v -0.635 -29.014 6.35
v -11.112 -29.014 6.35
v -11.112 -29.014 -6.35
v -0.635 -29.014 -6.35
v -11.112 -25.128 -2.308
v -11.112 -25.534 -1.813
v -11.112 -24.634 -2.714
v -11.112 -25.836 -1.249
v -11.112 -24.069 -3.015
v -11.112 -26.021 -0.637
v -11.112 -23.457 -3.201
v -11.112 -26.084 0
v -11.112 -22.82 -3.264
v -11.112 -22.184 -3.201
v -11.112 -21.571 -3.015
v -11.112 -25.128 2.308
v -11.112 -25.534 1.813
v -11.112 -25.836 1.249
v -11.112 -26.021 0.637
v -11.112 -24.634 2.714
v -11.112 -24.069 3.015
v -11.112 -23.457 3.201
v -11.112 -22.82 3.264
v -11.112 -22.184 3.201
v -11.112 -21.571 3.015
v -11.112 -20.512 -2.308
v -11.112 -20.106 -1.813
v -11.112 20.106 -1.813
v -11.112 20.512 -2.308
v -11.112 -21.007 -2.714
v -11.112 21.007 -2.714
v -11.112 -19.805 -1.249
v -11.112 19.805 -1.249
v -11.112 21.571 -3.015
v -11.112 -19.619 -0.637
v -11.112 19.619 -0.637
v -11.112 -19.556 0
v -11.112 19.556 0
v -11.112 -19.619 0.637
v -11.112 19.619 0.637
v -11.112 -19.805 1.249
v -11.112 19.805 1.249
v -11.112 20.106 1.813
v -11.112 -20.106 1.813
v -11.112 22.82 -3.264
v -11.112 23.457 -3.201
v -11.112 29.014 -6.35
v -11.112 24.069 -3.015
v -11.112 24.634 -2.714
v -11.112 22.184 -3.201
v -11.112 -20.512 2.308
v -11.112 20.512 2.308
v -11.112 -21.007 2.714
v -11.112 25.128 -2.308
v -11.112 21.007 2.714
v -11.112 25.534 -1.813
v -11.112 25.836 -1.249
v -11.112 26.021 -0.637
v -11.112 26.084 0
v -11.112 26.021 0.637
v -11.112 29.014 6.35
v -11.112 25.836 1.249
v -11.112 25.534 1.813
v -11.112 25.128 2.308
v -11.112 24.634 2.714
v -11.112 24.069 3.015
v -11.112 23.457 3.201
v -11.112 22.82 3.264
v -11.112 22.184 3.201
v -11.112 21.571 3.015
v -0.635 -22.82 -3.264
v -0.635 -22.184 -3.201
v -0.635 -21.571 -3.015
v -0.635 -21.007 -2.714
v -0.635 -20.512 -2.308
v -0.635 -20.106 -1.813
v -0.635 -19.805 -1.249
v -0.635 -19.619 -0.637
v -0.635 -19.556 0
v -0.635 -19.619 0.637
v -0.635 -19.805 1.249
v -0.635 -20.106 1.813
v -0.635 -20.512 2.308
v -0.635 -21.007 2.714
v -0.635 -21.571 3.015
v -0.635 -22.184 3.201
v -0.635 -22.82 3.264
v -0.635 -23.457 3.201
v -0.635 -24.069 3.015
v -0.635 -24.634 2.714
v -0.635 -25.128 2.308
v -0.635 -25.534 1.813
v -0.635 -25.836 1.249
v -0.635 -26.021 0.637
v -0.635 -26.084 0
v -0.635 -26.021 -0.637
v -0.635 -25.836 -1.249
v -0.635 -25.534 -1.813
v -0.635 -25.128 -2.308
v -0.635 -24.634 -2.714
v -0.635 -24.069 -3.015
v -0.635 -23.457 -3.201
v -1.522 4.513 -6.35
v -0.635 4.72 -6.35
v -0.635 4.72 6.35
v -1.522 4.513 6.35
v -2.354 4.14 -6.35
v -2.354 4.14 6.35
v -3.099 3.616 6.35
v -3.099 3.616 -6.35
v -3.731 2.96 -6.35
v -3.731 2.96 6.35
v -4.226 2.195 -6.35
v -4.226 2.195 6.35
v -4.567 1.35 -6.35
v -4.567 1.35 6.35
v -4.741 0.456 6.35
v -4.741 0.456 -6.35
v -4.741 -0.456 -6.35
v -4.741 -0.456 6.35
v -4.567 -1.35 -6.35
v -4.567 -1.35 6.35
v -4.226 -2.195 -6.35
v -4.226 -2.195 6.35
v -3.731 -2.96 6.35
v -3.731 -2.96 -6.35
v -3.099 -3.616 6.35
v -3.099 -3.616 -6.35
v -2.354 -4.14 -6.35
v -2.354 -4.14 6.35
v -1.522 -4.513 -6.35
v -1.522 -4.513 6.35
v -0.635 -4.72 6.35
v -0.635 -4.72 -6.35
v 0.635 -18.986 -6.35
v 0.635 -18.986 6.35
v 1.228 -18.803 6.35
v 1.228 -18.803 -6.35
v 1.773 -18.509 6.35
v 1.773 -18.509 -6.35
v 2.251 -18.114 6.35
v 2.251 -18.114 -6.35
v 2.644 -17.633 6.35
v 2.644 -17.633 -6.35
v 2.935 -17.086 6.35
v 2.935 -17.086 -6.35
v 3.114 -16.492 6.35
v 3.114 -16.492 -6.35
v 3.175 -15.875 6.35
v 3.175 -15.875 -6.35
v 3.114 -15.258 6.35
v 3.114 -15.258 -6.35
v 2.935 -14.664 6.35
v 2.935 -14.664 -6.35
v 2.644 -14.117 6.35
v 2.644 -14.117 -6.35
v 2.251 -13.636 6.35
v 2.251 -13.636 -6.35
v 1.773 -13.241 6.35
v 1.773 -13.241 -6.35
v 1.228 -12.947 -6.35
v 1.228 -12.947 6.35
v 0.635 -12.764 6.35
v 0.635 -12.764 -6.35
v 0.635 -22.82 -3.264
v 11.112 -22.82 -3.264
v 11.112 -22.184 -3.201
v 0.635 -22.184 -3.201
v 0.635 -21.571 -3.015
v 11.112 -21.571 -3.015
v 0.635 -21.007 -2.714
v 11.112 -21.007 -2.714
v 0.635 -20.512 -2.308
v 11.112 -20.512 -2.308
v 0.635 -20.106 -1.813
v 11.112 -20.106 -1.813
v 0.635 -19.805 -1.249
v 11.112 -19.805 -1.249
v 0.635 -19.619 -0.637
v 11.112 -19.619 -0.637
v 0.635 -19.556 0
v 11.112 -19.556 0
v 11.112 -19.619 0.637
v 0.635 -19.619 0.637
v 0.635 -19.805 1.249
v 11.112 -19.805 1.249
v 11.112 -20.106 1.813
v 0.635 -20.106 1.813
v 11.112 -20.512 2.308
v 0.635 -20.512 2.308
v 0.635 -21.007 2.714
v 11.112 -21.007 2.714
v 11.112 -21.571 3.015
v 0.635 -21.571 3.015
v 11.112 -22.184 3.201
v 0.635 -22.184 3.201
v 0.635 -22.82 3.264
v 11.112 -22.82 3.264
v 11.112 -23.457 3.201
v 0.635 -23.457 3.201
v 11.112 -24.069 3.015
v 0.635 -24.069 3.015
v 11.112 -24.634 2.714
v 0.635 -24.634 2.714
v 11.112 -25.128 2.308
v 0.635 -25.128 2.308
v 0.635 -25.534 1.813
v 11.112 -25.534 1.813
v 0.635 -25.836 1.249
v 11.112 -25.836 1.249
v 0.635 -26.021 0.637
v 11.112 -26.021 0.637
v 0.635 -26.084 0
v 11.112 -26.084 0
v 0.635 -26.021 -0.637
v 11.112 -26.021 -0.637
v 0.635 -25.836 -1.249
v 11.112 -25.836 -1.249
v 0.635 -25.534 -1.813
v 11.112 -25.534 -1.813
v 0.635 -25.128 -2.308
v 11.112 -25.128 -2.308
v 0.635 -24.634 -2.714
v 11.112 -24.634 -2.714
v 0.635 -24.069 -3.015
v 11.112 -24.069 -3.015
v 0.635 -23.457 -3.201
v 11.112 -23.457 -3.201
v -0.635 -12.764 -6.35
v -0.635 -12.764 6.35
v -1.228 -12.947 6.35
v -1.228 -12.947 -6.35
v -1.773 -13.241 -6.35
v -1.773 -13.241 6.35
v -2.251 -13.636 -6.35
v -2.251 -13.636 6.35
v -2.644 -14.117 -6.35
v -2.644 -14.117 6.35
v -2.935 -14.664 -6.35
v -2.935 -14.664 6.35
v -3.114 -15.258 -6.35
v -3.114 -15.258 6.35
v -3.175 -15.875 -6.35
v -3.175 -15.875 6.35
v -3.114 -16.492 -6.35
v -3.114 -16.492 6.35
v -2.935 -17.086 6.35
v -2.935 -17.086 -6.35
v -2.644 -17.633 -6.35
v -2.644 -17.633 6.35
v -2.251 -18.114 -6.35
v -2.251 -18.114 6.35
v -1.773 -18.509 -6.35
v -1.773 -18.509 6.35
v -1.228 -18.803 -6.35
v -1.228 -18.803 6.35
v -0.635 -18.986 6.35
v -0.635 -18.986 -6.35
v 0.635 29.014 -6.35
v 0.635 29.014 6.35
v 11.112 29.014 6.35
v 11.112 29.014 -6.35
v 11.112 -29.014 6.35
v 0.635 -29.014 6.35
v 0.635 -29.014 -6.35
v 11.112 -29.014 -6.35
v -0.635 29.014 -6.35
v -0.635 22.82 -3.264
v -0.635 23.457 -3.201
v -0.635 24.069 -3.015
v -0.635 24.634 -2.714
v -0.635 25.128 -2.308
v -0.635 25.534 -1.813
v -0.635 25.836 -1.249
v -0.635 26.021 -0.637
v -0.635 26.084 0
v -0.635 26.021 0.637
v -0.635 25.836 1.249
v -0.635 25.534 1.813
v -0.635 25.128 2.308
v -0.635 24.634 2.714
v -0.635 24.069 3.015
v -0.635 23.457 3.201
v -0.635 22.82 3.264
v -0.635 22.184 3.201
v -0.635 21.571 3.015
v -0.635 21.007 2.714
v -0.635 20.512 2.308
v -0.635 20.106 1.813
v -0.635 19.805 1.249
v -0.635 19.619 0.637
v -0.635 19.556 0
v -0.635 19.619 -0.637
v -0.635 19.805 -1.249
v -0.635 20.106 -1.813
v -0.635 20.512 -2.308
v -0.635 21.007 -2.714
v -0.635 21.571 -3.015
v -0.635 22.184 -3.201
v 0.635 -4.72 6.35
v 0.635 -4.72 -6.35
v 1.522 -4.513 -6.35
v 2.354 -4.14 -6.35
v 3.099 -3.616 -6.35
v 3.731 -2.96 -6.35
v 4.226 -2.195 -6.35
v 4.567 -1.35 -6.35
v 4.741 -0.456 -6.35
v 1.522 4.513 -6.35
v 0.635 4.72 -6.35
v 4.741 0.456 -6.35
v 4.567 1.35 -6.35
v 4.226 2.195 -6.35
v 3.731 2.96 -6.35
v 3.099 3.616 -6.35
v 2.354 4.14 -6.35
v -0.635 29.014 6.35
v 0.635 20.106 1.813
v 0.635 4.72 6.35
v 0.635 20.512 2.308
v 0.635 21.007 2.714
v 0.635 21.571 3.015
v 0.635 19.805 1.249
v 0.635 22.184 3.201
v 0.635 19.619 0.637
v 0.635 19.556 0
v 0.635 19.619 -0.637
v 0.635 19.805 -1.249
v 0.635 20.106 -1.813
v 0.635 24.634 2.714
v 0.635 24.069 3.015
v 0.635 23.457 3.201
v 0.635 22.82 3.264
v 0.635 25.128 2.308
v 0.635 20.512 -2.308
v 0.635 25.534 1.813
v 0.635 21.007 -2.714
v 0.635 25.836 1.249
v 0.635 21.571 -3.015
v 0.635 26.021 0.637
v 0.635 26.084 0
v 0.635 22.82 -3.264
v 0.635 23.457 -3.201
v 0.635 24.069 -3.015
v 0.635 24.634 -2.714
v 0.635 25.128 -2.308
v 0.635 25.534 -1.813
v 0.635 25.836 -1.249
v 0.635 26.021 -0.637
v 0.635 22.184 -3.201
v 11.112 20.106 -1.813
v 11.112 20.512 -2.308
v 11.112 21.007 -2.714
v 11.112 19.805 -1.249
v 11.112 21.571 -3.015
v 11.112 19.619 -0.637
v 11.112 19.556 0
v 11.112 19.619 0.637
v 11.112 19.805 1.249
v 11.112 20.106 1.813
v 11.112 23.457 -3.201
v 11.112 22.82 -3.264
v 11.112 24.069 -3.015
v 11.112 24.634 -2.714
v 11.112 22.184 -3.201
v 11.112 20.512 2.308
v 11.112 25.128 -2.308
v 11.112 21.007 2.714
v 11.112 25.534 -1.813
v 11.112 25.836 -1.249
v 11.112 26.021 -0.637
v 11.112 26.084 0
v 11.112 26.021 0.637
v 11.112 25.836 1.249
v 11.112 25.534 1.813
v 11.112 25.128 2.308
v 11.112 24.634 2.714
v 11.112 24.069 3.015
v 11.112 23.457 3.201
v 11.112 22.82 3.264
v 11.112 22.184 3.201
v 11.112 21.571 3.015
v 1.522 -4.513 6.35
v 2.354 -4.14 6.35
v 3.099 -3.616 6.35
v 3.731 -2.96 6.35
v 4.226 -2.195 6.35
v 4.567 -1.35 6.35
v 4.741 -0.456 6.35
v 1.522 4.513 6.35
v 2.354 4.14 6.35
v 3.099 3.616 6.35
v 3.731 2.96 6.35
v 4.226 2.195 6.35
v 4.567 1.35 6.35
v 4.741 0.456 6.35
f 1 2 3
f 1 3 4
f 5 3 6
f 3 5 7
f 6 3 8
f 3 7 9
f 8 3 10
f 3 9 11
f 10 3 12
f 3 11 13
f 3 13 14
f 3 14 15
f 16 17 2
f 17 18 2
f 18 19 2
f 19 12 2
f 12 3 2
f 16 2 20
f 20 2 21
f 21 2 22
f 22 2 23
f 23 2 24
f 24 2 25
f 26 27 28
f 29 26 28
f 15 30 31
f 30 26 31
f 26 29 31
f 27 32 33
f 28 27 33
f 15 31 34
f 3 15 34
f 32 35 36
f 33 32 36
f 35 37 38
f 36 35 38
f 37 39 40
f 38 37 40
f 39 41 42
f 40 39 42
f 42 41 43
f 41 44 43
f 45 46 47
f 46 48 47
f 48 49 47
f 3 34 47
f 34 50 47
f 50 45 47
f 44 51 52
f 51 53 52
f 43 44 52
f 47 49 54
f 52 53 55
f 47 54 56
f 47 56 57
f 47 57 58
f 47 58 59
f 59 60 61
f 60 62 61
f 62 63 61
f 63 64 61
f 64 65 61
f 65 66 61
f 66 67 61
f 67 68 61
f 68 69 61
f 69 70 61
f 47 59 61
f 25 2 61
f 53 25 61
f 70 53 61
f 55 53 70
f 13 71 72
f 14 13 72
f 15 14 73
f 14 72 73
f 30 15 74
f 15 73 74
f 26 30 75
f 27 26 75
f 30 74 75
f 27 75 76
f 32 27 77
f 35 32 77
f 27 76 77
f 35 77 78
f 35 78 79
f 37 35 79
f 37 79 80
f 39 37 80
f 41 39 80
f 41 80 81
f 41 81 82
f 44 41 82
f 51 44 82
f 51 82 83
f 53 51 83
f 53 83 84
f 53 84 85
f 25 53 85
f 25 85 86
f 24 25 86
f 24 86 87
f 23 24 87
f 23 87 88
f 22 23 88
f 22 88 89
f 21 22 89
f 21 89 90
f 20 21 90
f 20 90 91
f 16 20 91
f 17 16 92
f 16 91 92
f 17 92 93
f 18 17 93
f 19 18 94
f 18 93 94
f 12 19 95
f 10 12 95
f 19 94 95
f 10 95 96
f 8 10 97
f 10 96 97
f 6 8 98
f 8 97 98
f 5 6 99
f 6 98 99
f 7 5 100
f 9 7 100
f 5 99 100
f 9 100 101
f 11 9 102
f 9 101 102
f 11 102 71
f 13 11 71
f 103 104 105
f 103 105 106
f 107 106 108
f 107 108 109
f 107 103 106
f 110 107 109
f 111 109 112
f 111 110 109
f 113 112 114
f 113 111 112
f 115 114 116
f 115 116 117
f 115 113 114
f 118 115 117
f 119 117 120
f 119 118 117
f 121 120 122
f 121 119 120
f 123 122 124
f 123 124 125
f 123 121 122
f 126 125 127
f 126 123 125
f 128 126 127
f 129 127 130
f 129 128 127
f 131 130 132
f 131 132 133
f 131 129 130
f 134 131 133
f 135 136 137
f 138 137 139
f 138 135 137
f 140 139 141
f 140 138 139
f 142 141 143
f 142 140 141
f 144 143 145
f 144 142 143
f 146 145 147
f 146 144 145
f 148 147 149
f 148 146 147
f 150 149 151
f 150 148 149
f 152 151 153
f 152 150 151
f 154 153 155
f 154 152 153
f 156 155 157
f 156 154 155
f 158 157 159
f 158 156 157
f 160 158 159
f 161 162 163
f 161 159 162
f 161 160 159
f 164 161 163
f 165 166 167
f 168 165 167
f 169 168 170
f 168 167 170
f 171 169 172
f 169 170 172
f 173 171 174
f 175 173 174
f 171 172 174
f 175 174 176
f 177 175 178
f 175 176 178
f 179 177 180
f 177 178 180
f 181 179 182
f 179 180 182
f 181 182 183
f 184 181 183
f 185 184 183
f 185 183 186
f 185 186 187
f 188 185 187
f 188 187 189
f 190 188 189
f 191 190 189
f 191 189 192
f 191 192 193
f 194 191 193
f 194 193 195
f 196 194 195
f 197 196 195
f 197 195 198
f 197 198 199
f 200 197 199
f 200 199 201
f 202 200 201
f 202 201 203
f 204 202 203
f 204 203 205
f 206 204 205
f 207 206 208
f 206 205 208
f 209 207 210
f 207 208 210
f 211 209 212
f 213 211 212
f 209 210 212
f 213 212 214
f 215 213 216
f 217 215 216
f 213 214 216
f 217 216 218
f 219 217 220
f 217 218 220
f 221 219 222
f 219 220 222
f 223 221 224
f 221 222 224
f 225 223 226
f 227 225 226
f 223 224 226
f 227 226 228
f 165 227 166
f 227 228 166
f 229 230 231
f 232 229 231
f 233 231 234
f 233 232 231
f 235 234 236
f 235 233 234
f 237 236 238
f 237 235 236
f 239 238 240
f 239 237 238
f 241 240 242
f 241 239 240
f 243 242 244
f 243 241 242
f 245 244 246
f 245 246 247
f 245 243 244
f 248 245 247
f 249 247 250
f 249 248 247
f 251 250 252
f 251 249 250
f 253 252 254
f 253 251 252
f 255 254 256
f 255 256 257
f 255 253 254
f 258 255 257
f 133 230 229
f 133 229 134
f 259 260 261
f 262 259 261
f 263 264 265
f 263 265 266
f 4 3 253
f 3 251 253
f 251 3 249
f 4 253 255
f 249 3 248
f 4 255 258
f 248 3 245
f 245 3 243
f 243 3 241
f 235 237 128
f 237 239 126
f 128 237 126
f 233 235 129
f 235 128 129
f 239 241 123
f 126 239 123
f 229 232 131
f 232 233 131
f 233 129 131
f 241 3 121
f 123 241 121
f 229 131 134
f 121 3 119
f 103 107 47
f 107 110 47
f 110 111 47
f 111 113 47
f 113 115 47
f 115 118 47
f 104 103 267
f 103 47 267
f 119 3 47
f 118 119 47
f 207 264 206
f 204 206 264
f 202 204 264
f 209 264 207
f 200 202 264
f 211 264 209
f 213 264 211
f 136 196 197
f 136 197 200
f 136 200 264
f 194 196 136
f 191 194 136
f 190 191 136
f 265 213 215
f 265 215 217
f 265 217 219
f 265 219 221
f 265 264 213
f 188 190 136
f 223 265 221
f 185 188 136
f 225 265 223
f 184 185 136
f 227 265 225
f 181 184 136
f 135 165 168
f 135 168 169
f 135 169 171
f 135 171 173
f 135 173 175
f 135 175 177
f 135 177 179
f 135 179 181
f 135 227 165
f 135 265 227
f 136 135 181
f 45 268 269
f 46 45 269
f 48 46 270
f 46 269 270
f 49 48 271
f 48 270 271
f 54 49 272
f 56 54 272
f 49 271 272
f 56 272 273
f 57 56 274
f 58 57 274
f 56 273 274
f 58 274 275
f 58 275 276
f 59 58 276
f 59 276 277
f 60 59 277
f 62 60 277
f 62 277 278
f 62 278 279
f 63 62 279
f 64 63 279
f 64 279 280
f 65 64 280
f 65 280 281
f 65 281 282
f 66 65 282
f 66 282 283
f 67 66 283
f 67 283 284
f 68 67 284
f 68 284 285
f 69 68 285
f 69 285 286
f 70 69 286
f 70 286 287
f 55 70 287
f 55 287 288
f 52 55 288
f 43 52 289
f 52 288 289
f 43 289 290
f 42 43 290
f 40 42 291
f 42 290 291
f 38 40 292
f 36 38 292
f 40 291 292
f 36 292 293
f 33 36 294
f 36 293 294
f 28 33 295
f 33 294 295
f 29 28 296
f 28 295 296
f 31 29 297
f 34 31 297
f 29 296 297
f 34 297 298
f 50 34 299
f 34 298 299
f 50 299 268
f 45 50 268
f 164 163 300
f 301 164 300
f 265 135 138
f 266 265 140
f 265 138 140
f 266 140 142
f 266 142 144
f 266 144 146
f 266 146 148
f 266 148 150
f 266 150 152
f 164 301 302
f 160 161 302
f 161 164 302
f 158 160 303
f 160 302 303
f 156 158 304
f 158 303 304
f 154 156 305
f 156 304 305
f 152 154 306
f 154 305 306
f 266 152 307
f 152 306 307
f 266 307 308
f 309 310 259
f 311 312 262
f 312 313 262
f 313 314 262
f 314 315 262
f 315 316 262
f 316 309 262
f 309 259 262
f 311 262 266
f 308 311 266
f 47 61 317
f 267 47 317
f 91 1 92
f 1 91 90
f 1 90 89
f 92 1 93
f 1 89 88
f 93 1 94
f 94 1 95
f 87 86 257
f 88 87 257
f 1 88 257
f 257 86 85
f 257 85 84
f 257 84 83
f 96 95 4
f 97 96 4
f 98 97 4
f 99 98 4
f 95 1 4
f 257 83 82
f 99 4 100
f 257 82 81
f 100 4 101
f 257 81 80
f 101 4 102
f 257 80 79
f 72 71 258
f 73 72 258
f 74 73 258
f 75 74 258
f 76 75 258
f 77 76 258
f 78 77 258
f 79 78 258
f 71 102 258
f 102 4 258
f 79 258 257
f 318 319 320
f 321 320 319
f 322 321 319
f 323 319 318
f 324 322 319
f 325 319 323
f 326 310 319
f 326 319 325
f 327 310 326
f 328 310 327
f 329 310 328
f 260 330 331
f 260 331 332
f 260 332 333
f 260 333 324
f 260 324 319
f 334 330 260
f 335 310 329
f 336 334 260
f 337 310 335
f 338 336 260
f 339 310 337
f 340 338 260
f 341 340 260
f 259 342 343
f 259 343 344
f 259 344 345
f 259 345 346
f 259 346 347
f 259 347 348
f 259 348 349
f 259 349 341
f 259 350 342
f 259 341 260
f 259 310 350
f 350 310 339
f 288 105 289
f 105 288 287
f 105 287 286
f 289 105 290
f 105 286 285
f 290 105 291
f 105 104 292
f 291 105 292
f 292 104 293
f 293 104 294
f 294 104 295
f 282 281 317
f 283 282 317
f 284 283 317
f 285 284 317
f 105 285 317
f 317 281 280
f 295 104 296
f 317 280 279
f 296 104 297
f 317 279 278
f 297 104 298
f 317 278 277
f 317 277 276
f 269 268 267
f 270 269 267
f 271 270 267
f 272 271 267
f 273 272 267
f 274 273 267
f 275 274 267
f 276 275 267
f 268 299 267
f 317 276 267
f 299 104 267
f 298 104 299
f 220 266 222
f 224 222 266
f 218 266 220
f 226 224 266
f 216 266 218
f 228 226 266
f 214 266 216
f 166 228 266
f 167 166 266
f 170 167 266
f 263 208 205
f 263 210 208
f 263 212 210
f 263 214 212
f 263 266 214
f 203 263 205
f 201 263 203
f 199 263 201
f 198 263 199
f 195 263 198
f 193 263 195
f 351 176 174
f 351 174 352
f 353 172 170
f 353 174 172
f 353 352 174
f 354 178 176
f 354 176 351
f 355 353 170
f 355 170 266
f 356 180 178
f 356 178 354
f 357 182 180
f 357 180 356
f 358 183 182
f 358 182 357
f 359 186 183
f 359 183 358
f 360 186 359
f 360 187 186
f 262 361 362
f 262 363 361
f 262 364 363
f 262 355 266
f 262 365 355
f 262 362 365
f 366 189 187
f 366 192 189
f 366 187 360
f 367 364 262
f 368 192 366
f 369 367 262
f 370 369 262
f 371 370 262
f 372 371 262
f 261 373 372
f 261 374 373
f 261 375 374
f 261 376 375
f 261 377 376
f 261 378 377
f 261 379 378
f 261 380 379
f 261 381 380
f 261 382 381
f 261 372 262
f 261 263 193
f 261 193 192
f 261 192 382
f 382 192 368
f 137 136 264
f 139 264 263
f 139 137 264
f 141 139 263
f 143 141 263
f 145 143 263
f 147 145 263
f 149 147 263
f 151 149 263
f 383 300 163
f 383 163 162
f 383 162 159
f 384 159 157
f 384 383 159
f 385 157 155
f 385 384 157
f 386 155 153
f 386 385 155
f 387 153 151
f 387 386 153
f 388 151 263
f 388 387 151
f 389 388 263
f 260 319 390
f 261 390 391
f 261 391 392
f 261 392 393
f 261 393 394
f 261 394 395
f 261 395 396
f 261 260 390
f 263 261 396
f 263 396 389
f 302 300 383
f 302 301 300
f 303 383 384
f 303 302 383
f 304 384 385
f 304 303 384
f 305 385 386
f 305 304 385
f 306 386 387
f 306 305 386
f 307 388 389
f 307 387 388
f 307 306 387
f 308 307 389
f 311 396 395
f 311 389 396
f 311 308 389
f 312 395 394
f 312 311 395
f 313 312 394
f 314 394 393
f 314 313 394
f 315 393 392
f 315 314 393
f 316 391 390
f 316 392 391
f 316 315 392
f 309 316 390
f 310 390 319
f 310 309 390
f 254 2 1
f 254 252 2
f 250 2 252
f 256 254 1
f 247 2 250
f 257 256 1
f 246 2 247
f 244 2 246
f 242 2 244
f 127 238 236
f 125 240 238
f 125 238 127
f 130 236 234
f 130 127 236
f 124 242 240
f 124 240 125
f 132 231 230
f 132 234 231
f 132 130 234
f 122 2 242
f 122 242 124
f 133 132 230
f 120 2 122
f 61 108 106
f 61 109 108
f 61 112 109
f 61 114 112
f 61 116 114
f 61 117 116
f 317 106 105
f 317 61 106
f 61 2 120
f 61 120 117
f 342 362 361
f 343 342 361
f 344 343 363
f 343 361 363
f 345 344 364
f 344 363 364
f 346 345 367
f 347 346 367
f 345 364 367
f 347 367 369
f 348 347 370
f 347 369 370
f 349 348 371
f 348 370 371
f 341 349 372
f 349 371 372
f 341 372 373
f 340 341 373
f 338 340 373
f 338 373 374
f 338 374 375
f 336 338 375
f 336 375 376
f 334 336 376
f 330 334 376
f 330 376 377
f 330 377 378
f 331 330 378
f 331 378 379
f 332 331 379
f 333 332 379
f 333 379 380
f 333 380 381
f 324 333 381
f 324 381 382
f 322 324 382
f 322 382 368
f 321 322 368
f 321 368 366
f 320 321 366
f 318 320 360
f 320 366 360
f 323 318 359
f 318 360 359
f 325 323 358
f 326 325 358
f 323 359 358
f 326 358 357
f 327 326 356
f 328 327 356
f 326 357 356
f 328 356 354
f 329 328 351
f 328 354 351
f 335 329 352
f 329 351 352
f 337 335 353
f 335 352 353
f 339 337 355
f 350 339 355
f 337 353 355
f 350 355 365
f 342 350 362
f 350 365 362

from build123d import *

# Parameters (mm, degrees)
SKETCH1_W               = 22.225
SKETCH1_H               = 58.027453668
SKETCH1_R               = 4.7625
SKETCH1_R_2             = 3.175
BOSS_EXTRUDE1_DEPTH     = 6.35
F_1_4_CLEARANCE_HOLE1_D = 6.5278
CUT_EXTRUDE1_DEPTH      = 32.711299265
CUT_EXTRUDE1_DEPTH_BACK = 32.711299265
SKETCH4_W               = 1.27
SKETCH4_H               = 62.020650964


with BuildPart() as part:
    # Sketch1 → Boss-Extrude1 (new, symmetric)
    with BuildSketch(Plane.XY):
        Rectangle(SKETCH1_W, SKETCH1_H)
        Circle(SKETCH1_R, mode=Mode.SUBTRACT)
        with Locations((0, -15.875)):
            Circle(SKETCH1_R_2, mode=Mode.SUBTRACT)
    extrude(amount=BOSS_EXTRUDE1_DEPTH, both=True)

    # 1/4 Clearance Hole1 (through all)
    with Locations(Plane.ZY.offset(11.1125)):
        with Locations((0, 22.8203125), (0, -22.8203125)):
            Hole(F_1_4_CLEARANCE_HOLE1_D / 2)

    # Sketch4 → Cut-Extrude1 (cut, two sides: drawn at the far end of the back side and taken through both)
    with BuildSketch(Plane.XY.offset(-CUT_EXTRUDE1_DEPTH_BACK)):
        Rectangle(SKETCH4_W, SKETCH4_H)
    extrude(amount=CUT_EXTRUDE1_DEPTH + CUT_EXTRUDE1_DEPTH_BACK, mode=Mode.SUBTRACT)


with BuildPart() as cut_extrude1_piece_1:
    # of the separate pieces the step leaves, piece 1, a body of its own (cut_extrude1_pieces)
    add(part.part.solids().sort_by_distance((-11.1125, -29.013726834, 6.35))[0])


with BuildPart() as cut_extrude1_piece_2:
    # of the separate pieces the step leaves, piece 2, a body of its own (cut_extrude1_pieces)
    add(part.part.solids().sort_by_distance((0.635, -29.013726834, 6.35))[0])


solid = Compound([cut_extrude1_piece_1.part, cut_extrude1_piece_2.part])
